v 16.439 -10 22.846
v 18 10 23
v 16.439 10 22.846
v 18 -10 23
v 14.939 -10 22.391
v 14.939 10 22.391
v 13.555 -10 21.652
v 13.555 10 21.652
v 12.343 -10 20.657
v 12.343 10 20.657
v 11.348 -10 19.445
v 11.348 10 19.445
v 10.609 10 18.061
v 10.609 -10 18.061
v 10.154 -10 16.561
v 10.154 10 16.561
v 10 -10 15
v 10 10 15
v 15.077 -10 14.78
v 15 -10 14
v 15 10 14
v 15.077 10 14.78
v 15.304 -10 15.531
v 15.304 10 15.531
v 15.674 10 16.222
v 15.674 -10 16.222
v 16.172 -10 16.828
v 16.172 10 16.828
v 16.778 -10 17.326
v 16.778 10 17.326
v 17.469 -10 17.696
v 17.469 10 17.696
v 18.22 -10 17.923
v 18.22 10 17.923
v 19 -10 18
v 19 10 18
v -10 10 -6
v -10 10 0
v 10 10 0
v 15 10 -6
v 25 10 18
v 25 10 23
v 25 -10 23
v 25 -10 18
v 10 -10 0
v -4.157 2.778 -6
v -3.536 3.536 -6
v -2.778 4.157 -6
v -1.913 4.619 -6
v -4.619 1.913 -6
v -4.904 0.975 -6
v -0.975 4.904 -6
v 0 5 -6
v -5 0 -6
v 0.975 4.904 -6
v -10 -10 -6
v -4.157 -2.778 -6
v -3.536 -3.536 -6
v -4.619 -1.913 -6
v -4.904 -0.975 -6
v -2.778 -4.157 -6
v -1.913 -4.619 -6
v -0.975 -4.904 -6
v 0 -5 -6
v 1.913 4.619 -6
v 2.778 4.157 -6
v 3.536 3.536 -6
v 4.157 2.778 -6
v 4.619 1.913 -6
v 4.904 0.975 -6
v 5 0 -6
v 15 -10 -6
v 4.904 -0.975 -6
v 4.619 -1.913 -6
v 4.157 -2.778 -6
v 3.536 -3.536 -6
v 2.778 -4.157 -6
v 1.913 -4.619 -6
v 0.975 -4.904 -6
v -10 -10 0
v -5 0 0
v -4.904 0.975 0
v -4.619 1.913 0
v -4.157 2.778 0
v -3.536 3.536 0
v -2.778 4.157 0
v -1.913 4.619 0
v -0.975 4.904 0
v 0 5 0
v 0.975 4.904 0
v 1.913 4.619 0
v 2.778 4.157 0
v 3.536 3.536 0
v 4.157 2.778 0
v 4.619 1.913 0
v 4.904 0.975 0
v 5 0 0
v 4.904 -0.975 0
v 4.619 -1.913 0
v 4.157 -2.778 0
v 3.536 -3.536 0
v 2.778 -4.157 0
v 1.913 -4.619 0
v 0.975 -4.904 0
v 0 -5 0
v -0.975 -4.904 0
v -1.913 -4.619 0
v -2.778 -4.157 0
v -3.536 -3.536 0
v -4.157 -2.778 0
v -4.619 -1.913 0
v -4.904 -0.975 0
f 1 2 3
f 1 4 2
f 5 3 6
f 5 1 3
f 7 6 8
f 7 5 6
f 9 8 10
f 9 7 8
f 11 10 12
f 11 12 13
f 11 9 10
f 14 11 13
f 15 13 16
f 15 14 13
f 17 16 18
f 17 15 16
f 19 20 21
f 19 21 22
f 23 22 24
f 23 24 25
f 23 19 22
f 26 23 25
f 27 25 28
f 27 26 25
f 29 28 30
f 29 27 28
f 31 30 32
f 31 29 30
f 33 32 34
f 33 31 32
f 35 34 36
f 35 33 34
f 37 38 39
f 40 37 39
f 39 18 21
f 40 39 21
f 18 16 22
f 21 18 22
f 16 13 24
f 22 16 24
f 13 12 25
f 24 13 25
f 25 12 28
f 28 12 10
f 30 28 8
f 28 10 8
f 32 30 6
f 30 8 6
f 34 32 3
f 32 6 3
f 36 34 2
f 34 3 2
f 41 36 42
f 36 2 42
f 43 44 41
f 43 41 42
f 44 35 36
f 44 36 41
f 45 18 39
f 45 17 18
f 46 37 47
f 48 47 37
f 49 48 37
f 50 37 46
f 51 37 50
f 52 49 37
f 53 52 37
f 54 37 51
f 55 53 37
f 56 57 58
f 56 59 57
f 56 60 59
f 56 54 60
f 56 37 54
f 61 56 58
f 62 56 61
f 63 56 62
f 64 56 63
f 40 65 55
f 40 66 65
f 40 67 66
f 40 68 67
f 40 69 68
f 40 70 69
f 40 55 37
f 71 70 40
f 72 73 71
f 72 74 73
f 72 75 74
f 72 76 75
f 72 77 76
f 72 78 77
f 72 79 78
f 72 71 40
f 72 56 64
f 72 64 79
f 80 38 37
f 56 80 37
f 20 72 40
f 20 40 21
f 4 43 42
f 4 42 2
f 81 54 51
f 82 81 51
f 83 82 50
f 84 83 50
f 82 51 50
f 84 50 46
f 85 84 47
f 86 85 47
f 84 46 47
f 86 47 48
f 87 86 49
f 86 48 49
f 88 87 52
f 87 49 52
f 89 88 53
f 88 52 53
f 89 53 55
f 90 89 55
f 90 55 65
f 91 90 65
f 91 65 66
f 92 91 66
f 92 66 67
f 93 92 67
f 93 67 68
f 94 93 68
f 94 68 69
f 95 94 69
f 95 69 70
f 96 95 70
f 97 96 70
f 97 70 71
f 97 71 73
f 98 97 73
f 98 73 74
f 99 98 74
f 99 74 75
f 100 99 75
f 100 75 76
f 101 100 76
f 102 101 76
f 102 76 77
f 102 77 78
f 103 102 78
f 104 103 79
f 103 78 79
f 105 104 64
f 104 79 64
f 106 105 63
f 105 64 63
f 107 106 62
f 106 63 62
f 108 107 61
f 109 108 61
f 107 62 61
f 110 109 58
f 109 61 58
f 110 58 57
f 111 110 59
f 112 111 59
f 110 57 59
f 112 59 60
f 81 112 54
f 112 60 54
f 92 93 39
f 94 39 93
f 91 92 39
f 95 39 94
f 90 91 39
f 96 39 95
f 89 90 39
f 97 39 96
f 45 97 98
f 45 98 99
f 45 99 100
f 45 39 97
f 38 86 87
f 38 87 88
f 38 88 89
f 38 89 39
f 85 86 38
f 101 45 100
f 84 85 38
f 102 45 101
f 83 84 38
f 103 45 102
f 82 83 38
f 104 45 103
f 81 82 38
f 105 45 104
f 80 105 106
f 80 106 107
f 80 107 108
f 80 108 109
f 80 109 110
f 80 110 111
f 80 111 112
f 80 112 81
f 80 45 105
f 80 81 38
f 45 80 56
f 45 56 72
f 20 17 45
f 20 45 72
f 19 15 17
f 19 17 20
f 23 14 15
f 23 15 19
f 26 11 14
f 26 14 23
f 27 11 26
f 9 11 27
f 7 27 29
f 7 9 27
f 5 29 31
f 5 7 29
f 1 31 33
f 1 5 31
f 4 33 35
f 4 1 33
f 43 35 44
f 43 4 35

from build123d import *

# Parameters (mm, degrees)
F1_DEPTH = 10
F3_D     = 10
F3_DEPTH = 12


with BuildPart() as f1:
    # F0 (on Front) → F1 (new body, symmetric)
    with BuildSketch(Plane.XZ):
        with BuildLine():
            Line((10, 0), (-10, 0))
            Line((-10, 0), (-10, -6))
            Line((-10, -6), (15, -6))
            Line((15, -6), (15, 14))
            ThreePointArc((15, 14), (16.171573, 16.828427), (19, 18))
            Line((19, 18), (25, 18))
            Line((25, 18), (25, 23))
            Line((25, 23), (18, 23))
            ThreePointArc((18, 23), (12.343146, 20.656854), (10, 15))
            Line((10, 15), (10, 0))
        make_face()
    extrude(amount=F1_DEPTH, both=True)

    # F3
    with Locations(Plane.XY):
        with Locations((0, 0)):
            Hole(F3_D / 2, depth=F3_DEPTH)


solid = f1.part
